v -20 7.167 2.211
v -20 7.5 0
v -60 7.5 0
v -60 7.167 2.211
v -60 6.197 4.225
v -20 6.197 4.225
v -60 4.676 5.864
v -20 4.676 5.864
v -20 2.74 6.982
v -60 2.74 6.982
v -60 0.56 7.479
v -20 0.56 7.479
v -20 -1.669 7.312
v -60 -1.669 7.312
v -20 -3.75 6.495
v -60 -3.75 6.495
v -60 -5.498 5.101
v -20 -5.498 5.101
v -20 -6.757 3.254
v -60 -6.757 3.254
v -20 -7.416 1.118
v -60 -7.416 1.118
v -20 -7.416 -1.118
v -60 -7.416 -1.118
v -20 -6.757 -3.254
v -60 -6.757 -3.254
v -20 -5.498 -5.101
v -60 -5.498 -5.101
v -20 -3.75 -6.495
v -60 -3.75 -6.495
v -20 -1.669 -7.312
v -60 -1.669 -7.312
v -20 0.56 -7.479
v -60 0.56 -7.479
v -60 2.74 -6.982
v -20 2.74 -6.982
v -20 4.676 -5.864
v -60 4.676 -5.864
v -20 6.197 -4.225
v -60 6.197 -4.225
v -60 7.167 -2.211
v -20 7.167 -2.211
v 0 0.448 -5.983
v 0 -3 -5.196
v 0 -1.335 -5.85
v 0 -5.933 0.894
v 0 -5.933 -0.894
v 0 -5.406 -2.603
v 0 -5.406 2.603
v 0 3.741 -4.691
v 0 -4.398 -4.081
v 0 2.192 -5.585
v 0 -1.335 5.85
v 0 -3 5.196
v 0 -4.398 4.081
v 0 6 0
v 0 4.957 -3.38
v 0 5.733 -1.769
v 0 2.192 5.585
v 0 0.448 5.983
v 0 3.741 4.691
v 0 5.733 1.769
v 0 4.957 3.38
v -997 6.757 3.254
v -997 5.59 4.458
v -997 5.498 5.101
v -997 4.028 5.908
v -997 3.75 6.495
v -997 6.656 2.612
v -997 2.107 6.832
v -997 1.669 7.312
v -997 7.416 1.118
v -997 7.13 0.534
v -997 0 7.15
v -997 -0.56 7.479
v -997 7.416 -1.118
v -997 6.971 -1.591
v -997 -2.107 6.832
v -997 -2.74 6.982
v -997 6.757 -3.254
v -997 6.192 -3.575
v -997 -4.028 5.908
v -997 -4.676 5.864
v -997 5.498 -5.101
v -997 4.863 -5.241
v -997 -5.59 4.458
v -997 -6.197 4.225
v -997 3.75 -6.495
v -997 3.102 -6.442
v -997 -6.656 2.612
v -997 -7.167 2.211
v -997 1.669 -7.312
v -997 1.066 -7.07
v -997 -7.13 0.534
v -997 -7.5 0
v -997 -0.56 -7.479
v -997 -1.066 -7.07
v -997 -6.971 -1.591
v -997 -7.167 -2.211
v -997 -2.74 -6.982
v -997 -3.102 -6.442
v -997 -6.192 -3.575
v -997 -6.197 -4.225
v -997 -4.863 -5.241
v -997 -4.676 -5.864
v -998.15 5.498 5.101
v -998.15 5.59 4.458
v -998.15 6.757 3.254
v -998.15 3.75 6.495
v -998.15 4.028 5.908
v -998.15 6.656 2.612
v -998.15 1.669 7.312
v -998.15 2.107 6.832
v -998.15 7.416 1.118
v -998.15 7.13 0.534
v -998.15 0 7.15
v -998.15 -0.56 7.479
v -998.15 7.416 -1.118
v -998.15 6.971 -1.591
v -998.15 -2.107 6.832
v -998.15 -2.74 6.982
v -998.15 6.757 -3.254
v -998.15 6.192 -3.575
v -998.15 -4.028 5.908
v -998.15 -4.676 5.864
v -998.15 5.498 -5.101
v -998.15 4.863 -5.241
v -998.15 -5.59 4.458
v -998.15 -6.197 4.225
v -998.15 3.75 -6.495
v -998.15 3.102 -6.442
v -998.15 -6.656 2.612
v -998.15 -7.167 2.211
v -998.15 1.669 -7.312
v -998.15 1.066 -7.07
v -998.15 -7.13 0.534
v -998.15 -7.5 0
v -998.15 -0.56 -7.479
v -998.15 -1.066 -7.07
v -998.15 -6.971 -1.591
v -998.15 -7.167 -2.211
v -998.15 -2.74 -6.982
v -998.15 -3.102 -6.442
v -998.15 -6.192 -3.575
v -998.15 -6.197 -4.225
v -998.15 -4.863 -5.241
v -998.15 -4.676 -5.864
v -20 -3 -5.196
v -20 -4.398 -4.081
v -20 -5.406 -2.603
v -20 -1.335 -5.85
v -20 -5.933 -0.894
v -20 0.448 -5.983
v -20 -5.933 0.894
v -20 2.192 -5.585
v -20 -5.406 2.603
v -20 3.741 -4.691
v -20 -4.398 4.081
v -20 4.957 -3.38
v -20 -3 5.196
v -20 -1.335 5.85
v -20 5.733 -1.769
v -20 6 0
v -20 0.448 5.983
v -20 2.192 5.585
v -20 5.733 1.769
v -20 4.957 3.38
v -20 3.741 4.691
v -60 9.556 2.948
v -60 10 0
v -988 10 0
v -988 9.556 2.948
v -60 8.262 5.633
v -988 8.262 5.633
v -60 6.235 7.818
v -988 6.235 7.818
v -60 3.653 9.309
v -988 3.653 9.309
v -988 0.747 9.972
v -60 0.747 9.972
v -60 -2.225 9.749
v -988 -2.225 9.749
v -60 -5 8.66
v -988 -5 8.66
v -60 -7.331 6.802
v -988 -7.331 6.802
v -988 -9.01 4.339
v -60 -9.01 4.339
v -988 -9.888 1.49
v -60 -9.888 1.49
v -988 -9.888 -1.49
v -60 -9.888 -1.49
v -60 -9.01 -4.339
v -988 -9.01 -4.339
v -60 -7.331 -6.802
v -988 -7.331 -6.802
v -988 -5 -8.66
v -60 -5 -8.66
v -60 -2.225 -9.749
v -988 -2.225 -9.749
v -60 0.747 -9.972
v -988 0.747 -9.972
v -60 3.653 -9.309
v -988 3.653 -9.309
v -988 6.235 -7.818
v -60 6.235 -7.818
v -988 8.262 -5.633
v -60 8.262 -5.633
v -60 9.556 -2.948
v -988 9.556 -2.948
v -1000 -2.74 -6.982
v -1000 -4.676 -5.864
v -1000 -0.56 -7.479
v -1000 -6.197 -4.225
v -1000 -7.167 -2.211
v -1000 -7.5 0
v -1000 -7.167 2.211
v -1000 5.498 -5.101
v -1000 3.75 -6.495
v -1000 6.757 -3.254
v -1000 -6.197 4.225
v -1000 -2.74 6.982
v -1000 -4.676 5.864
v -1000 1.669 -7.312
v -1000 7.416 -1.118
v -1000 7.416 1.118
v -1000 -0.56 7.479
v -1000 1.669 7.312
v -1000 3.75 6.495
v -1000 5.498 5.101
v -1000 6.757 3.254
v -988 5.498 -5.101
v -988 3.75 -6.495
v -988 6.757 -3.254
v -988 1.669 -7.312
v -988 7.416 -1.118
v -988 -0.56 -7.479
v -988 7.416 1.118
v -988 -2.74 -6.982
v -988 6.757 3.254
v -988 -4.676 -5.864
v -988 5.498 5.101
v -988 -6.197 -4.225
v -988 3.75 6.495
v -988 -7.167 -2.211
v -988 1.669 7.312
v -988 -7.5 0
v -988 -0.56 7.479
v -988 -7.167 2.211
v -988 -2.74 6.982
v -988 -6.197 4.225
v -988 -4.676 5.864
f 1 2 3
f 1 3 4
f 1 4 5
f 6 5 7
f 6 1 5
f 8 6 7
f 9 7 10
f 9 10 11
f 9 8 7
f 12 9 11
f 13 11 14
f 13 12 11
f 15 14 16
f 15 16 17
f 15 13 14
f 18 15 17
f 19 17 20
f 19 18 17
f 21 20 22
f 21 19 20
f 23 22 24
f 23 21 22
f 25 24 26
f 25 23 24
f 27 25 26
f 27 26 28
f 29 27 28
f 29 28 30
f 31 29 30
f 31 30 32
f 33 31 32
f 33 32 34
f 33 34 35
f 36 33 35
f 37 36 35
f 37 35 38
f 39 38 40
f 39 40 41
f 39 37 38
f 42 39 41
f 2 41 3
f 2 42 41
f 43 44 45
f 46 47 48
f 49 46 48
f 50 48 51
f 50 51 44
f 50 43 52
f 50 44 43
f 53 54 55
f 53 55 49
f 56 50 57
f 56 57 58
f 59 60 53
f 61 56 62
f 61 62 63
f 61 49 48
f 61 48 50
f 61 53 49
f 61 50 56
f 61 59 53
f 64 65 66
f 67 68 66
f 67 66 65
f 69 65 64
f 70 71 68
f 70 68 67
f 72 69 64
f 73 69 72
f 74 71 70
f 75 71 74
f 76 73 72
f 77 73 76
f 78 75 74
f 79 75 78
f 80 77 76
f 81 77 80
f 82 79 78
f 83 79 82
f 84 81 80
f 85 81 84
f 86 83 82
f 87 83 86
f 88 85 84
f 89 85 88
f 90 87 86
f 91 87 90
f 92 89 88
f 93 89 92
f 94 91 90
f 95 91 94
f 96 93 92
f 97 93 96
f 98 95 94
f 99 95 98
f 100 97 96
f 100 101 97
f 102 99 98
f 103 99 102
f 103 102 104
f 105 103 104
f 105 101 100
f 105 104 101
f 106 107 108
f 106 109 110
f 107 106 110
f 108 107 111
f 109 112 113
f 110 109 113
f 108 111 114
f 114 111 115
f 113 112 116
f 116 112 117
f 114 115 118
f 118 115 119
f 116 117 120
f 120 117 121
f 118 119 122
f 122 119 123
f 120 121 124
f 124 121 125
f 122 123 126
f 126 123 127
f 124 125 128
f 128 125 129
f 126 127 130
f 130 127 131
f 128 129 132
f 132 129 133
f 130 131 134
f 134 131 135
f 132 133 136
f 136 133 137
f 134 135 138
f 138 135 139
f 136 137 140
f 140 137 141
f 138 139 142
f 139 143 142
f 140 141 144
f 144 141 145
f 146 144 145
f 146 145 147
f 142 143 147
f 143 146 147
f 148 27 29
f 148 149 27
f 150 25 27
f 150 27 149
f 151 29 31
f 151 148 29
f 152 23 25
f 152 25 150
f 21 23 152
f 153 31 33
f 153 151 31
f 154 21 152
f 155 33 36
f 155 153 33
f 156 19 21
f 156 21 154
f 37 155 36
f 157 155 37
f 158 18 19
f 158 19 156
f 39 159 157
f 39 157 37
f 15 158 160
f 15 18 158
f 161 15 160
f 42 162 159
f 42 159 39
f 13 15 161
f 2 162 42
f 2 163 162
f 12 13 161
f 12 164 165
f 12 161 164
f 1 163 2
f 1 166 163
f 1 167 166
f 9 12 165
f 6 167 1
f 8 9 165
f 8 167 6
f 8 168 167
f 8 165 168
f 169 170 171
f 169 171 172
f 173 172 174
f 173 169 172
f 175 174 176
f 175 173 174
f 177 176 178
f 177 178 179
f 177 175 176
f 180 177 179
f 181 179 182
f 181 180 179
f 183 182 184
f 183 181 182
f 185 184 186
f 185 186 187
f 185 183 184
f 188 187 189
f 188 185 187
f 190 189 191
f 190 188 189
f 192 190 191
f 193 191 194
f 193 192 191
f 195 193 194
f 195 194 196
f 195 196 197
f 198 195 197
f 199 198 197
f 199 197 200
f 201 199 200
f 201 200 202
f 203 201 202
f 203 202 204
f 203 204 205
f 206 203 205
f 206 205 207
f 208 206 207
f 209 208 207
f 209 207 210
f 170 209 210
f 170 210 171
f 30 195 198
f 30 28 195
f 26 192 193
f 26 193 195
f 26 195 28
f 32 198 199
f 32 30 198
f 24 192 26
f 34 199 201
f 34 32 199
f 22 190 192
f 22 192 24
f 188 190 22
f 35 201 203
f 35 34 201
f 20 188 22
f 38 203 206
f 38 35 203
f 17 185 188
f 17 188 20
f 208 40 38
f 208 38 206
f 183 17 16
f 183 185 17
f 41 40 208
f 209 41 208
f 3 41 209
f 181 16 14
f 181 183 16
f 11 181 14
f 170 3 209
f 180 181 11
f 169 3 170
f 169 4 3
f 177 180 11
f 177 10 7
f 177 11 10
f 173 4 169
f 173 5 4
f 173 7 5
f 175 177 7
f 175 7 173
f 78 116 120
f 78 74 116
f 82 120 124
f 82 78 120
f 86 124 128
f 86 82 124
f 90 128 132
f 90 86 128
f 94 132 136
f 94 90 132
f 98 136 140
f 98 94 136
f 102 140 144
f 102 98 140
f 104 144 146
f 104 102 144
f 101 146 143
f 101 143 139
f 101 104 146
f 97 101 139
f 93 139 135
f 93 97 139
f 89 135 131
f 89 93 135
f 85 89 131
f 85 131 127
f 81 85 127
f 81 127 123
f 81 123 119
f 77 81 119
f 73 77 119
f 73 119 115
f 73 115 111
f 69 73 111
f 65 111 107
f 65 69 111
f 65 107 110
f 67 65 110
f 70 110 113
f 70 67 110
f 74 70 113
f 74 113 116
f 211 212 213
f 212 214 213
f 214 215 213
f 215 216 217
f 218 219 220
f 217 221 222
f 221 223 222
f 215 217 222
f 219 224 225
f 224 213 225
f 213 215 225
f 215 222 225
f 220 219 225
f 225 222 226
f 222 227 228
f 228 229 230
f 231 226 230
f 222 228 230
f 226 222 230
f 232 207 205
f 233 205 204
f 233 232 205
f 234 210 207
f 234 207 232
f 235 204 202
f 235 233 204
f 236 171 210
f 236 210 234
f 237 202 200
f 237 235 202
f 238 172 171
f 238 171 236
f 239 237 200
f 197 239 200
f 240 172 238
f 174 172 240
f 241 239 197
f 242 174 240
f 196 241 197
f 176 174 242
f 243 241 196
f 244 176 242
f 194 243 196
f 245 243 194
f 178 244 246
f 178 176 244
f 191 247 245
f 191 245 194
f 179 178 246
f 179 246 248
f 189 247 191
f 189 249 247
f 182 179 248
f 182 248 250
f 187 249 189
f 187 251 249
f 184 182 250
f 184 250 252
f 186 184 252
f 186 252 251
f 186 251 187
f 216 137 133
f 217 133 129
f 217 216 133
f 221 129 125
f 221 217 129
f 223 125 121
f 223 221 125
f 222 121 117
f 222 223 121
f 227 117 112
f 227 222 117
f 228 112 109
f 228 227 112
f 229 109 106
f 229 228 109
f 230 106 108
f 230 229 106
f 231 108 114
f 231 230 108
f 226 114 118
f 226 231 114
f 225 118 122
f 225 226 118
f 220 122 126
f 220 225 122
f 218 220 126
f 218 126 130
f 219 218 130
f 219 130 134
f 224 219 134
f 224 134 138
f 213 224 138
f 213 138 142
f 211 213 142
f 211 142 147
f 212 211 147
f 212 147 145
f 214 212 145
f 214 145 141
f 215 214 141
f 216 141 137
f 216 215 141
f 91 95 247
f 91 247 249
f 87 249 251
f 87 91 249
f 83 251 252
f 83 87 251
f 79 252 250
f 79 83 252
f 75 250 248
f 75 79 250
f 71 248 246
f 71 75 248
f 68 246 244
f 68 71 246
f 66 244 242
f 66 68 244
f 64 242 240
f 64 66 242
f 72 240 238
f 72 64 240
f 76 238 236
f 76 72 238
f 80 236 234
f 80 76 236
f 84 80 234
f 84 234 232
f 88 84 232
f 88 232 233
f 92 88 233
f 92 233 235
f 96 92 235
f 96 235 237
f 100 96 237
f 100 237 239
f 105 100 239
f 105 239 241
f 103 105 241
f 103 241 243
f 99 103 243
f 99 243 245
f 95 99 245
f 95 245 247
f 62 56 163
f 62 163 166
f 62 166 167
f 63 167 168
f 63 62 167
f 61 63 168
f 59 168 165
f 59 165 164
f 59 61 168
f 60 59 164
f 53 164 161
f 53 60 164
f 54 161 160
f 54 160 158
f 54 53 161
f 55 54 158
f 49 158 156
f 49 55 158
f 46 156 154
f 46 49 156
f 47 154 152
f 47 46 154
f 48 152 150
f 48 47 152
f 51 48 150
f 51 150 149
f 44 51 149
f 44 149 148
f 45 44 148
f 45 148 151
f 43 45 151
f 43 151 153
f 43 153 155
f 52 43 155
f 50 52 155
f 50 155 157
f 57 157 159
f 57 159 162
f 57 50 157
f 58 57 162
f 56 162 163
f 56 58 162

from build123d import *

# Parameters (mm, degrees)
F0_R     = 10
F1_DEPTH = 1000
F2_R     = 10
F2_R_2   = 6
F3_DEPTH = 20
F4_R     = 10
F4_R_2   = 7.5
F5_DEPTH = 40
F6_R     = 10
F6_R_2   = 7.5
F7_DEPTH = 12
F8_W     = 1.15
F8_H     = 0.35


with BuildPart() as f1:
    # F0 (on Right) → F1 (new body)
    with BuildSketch(Plane.YZ):
        Circle(F0_R)
    extrude(amount=-F1_DEPTH)

    # F2 (on face) → F3 (cut)
    with BuildSketch(Plane.YZ):
        Circle(F2_R)
        Circle(F2_R_2, mode=Mode.SUBTRACT)
    extrude(amount=-F3_DEPTH, mode=Mode.SUBTRACT)

    # F4 (on face) → F5 (cut)
    with BuildSketch(Plane.YZ.offset(-20)):
        Circle(F4_R)
        Circle(F4_R_2, mode=Mode.SUBTRACT)
    extrude(amount=-F5_DEPTH, mode=Mode.SUBTRACT)

    # F6 (on face) → F7 (cut)
    with BuildSketch(Plane(origin=(-1000, 0, 0), x_dir=(0, -1, 0), z_dir=(-1, 0, 0))):
        Circle(F6_R)
        Circle(F6_R_2, mode=Mode.SUBTRACT)
    extrude(amount=-F7_DEPTH, mode=Mode.SUBTRACT)

    # F8 (on Front) → F9 (revolve, cut)
    with BuildSketch(Plane.XZ):
        with Locations((-997.575, 7.325)):
            Rectangle(F8_W, F8_H)
    revolve(axis=Axis((-986.6362512112, 0, 0), (1, 0, 0)), mode=Mode.SUBTRACT)


solid = f1.part
